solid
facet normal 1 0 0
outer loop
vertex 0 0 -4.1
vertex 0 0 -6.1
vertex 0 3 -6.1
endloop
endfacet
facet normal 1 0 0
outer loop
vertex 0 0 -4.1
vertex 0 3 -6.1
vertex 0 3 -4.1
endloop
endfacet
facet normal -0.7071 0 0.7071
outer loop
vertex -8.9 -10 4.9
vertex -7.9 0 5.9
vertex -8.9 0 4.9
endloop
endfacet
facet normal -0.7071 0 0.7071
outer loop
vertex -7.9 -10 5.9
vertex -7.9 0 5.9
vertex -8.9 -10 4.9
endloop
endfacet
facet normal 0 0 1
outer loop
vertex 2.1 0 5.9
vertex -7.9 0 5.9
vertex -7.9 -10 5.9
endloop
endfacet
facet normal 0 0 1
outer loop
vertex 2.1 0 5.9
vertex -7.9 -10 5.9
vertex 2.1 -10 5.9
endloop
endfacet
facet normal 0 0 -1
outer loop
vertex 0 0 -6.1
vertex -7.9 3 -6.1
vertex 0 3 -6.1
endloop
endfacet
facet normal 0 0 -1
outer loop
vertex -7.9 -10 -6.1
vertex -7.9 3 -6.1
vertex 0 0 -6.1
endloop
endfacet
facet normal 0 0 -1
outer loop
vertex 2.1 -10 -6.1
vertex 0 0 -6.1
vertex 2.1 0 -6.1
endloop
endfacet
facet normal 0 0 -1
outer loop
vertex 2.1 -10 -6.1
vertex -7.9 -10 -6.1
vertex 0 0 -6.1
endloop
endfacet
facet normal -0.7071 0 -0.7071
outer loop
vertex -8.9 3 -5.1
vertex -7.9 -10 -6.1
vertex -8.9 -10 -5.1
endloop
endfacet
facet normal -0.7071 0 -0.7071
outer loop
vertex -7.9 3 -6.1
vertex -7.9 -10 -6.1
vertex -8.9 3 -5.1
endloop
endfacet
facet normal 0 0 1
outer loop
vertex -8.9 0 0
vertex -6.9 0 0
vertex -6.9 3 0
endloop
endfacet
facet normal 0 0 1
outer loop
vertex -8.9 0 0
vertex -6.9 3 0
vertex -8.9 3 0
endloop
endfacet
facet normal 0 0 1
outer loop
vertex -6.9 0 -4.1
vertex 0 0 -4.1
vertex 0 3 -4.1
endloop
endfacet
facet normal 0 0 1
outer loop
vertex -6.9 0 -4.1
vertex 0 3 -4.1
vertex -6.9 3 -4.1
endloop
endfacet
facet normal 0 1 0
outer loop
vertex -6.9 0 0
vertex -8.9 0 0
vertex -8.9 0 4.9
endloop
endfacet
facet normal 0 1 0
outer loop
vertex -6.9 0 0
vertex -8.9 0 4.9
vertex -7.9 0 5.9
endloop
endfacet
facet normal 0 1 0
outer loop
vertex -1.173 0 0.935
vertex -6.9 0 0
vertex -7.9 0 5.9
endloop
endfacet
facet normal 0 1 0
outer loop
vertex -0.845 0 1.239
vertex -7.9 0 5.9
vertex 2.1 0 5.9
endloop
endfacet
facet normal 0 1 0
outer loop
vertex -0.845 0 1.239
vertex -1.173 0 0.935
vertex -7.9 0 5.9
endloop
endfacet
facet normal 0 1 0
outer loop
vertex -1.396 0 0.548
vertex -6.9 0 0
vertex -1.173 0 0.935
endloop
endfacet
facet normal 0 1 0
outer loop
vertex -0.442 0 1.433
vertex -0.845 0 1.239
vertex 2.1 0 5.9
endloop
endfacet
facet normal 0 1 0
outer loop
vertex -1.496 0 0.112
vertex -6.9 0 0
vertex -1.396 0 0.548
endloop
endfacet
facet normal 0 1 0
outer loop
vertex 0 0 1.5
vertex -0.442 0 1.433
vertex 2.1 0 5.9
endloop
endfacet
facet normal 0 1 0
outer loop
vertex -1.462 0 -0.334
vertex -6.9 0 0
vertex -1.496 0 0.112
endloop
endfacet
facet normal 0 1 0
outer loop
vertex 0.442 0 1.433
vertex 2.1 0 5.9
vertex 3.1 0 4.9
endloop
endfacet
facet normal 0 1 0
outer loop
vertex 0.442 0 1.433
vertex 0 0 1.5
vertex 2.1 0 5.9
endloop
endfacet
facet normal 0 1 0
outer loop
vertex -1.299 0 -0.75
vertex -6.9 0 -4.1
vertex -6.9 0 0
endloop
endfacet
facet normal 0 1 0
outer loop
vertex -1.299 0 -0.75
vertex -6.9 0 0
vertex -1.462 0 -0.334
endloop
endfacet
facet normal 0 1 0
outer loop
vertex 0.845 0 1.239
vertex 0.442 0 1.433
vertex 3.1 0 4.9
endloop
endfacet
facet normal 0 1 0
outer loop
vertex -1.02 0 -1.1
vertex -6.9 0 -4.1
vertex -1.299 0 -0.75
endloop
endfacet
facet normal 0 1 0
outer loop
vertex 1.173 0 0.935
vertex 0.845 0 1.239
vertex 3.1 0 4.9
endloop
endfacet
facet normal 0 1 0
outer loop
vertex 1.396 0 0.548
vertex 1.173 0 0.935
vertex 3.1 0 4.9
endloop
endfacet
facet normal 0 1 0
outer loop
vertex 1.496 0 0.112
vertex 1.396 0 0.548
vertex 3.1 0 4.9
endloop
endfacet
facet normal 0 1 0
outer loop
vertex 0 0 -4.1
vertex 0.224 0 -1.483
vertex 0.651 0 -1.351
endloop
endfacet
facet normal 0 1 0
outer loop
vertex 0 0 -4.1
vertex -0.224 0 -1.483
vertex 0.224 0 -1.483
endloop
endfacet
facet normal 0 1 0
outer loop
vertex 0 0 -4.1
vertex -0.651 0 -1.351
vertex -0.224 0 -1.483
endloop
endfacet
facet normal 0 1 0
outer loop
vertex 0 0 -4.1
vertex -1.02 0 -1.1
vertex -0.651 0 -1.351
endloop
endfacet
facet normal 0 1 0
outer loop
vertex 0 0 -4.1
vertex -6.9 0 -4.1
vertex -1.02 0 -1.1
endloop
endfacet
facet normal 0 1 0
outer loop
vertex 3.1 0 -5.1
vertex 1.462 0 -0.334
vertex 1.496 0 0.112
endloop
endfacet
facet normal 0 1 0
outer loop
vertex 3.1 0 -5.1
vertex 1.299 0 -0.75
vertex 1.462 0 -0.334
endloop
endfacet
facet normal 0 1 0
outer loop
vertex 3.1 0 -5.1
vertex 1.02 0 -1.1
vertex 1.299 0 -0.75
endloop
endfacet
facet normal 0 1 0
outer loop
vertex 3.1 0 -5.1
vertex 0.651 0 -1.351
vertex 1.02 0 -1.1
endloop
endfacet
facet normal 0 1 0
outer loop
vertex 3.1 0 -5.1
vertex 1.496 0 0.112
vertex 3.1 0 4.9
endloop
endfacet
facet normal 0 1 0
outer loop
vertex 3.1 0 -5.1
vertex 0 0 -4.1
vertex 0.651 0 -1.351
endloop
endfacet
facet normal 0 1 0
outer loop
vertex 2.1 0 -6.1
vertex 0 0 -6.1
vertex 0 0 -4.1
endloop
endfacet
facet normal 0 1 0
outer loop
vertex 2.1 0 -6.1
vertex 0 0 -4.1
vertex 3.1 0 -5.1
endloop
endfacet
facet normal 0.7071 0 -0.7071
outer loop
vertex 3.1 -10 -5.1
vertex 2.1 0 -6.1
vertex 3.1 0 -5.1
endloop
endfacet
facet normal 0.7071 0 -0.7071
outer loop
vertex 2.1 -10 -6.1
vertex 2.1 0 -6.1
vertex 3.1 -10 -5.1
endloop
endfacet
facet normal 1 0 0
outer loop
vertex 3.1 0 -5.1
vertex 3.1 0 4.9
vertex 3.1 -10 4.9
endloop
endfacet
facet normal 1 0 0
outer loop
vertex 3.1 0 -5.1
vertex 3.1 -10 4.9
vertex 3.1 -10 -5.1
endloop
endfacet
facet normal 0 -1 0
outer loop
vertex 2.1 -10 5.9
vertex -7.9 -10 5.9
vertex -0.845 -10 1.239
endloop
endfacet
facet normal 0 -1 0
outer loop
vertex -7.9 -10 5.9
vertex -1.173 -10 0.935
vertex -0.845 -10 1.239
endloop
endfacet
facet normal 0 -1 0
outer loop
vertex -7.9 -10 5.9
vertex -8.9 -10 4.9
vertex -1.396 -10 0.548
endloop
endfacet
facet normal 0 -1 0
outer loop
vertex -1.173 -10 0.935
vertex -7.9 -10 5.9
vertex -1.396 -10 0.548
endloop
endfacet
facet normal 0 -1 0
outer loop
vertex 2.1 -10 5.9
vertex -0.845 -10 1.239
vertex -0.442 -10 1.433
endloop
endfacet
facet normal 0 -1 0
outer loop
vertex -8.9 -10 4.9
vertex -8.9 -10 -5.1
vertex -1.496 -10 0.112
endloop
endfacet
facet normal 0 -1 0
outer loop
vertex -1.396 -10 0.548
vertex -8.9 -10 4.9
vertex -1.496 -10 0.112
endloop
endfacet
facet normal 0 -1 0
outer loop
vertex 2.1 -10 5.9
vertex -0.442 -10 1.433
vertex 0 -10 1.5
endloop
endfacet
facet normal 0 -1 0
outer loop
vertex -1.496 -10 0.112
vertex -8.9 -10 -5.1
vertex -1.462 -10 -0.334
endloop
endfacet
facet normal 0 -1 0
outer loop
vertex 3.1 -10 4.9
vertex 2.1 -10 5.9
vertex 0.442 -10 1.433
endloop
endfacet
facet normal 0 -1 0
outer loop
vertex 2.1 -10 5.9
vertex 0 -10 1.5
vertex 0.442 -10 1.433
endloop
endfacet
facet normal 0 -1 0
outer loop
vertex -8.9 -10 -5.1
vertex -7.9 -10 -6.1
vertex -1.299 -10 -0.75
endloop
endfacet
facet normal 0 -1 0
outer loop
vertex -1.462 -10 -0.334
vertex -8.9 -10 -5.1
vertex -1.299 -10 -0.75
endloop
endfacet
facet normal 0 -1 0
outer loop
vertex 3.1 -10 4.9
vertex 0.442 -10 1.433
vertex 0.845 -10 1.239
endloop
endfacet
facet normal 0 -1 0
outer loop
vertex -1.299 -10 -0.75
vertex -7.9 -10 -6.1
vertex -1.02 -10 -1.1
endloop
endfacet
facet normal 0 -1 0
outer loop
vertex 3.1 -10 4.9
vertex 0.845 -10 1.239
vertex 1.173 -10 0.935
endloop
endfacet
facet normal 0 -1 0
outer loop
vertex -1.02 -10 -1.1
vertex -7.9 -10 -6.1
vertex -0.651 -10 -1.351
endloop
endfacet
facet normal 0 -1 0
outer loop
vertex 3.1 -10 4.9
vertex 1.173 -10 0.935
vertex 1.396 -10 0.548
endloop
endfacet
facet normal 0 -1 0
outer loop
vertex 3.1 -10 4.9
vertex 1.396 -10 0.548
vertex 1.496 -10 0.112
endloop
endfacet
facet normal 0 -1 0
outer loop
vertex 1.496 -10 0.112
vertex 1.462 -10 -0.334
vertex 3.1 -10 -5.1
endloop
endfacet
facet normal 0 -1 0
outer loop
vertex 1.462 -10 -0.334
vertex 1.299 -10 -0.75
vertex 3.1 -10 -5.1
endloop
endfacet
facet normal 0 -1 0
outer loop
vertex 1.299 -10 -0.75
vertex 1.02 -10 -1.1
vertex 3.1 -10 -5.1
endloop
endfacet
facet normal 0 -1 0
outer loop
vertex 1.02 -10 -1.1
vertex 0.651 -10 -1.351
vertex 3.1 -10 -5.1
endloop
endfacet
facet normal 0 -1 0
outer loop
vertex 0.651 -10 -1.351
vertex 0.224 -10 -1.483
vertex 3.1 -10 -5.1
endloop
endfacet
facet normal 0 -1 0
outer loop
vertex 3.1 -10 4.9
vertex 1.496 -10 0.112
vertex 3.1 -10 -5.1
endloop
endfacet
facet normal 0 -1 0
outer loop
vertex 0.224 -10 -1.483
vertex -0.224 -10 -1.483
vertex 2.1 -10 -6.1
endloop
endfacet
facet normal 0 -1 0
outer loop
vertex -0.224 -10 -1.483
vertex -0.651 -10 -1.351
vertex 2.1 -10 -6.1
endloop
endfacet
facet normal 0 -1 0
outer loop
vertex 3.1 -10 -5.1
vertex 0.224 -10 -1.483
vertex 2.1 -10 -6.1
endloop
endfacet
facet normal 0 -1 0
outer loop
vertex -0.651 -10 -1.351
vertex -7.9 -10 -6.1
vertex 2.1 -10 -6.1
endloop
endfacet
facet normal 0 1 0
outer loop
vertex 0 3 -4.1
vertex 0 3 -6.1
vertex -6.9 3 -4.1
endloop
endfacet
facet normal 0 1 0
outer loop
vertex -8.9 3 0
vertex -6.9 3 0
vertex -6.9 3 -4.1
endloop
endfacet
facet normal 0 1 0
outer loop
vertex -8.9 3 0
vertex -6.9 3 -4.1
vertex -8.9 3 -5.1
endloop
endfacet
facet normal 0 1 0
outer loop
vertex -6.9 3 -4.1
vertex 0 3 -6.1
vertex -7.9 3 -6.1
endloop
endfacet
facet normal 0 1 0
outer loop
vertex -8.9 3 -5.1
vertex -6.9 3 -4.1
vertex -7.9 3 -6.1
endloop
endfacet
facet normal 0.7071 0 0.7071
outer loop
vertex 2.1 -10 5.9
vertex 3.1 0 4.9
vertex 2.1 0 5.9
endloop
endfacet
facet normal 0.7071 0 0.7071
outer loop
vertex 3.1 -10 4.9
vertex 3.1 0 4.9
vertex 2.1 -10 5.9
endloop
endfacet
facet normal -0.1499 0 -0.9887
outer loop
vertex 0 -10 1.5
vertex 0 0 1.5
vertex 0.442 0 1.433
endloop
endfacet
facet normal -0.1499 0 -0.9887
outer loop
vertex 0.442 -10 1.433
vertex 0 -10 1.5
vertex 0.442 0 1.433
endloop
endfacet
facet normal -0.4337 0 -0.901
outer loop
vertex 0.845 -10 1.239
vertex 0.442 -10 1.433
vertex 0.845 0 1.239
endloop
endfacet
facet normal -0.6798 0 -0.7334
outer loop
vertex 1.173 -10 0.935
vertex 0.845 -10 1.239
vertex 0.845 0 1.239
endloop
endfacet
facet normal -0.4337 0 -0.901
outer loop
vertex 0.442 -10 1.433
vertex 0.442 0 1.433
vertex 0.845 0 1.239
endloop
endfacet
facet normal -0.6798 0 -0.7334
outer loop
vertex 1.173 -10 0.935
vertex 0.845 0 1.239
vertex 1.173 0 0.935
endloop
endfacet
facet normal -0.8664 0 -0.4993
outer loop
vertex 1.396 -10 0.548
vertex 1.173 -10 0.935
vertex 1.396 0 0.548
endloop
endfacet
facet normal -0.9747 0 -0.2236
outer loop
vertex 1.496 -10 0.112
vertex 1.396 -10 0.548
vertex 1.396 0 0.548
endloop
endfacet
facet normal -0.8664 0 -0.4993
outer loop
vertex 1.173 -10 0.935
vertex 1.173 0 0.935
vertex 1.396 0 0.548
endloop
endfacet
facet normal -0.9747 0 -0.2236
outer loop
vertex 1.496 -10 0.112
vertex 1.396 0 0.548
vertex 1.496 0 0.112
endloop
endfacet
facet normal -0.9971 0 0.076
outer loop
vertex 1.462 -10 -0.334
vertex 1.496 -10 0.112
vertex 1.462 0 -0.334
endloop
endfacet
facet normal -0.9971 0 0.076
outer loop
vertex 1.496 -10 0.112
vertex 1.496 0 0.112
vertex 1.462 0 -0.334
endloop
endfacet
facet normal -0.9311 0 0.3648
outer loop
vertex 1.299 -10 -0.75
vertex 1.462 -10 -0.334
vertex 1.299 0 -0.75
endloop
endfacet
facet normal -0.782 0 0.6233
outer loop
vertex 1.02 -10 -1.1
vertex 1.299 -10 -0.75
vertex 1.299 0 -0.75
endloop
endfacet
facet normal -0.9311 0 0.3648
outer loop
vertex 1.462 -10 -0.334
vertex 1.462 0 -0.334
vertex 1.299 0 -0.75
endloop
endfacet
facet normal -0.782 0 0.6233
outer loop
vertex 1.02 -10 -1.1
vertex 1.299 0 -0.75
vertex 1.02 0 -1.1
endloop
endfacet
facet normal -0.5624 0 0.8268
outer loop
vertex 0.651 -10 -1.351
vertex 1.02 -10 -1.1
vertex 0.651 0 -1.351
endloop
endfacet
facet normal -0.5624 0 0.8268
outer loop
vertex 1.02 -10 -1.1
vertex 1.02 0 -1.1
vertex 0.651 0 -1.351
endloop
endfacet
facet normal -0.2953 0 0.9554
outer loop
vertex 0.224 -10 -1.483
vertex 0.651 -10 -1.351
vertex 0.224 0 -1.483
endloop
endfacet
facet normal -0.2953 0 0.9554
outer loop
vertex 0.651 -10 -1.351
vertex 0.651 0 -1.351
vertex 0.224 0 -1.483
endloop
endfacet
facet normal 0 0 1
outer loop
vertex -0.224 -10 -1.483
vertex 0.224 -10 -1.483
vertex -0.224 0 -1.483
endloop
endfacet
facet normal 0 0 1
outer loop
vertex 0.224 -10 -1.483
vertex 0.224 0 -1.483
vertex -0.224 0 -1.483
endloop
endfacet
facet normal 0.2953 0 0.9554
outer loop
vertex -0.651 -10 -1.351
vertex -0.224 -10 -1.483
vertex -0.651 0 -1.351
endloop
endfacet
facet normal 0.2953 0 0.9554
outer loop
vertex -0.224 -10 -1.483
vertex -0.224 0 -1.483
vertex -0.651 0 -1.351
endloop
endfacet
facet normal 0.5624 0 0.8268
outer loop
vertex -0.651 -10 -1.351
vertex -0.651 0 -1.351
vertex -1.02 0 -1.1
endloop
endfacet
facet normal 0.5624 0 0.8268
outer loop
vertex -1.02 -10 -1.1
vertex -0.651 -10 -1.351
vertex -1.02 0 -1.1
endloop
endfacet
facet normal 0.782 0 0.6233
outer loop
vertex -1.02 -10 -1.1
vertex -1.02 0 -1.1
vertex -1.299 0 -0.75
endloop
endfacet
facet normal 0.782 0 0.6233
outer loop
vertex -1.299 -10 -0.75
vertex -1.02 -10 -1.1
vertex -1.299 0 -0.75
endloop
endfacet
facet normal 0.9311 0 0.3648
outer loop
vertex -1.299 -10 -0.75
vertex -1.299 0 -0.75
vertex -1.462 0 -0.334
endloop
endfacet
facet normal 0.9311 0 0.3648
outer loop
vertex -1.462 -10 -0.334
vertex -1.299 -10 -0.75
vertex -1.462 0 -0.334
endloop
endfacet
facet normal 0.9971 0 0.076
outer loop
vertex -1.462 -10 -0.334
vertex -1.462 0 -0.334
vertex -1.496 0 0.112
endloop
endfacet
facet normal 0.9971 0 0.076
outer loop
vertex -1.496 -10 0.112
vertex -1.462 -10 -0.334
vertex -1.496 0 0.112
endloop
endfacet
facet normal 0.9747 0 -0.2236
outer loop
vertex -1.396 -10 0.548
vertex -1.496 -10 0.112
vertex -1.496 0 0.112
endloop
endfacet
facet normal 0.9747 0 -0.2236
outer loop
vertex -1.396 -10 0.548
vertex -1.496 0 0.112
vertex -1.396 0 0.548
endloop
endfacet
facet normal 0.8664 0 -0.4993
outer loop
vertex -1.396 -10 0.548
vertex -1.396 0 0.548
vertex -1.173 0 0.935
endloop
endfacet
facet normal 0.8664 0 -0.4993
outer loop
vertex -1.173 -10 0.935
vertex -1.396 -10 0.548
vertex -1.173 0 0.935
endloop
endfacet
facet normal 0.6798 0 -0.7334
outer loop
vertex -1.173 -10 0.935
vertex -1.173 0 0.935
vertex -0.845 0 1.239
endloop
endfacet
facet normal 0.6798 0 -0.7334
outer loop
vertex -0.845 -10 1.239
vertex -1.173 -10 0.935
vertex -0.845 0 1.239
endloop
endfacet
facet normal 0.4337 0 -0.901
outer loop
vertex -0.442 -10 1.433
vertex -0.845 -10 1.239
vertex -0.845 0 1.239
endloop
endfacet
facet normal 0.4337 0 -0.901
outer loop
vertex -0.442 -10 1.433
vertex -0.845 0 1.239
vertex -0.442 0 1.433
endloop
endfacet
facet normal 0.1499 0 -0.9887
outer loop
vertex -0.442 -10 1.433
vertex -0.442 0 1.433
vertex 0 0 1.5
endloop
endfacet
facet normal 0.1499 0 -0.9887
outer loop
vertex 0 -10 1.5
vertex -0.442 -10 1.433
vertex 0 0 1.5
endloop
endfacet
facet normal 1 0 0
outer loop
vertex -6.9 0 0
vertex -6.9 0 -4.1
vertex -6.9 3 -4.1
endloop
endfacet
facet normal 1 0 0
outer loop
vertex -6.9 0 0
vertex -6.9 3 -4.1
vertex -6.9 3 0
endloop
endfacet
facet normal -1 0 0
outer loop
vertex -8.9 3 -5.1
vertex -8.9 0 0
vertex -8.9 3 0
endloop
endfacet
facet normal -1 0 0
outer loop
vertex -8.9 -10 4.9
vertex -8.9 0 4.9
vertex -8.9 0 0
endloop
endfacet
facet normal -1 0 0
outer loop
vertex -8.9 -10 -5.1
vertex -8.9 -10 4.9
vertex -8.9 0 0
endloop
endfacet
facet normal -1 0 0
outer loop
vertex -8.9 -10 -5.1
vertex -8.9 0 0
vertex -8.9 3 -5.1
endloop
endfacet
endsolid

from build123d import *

# Parameters (mm, degrees)
SKETCH1_W           = 12
SKETCH1_H           = 12
BOSS_EXTRUDE1_DEPTH = 10
BOSS_EXTRUDE2_DEPTH = 3
CHAMFER1_SIZE       = 1
SKETCH1_4_R         = 1.5
CUT_EXTRUDE1_DEPTH  = 15.711220208


with BuildPart() as part:
    # Sketch1 → Boss-Extrude1 (new body)
    with BuildSketch(Plane(origin=(0, 0, 0), x_dir=(1, 0, 0), z_dir=(0, 1, 0))):
        with Locations((-2.9, 0.1)):
            Rectangle(SKETCH1_W, SKETCH1_H)
    extrude(amount=-BOSS_EXTRUDE1_DEPTH)

    # Sketch1<3> → Boss-Extrude2 (add)
    with BuildSketch(Plane(origin=(0, 0, 0), x_dir=(1, 0, 0), z_dir=(0, 1, 0))):
        Polygon((0, 6.1), (0, 4.1), (-6.9, 4.1), (-6.9, 0), (-8.9, 0), (-8.9, 6.1), align=None)
    extrude(amount=BOSS_EXTRUDE2_DEPTH)

    # Chamfer1
    chamfer1_edges = [part.edges().sort_by_distance(p)[0] for p in [
        (-8.9, -3.5, -6.1),
        (3.1, -5, -6.1),
        (3.1, -5, 5.9),
        (-8.9, -5, 5.9),
    ]]
    chamfer(chamfer1_edges, length=CHAMFER1_SIZE)

    # Sketch1<4> → Cut-Extrude1 (cut, through all)
    with BuildSketch(Plane(origin=(0, 0, 0), x_dir=(1, 0, 0), z_dir=(0, 1, 0))):
        with Locations(Location((0, 0, 0), (0, 0, 270))):
            Circle(SKETCH1_4_R)
    extrude(amount=-CUT_EXTRUDE1_DEPTH, mode=Mode.SUBTRACT)


solid = part.part
